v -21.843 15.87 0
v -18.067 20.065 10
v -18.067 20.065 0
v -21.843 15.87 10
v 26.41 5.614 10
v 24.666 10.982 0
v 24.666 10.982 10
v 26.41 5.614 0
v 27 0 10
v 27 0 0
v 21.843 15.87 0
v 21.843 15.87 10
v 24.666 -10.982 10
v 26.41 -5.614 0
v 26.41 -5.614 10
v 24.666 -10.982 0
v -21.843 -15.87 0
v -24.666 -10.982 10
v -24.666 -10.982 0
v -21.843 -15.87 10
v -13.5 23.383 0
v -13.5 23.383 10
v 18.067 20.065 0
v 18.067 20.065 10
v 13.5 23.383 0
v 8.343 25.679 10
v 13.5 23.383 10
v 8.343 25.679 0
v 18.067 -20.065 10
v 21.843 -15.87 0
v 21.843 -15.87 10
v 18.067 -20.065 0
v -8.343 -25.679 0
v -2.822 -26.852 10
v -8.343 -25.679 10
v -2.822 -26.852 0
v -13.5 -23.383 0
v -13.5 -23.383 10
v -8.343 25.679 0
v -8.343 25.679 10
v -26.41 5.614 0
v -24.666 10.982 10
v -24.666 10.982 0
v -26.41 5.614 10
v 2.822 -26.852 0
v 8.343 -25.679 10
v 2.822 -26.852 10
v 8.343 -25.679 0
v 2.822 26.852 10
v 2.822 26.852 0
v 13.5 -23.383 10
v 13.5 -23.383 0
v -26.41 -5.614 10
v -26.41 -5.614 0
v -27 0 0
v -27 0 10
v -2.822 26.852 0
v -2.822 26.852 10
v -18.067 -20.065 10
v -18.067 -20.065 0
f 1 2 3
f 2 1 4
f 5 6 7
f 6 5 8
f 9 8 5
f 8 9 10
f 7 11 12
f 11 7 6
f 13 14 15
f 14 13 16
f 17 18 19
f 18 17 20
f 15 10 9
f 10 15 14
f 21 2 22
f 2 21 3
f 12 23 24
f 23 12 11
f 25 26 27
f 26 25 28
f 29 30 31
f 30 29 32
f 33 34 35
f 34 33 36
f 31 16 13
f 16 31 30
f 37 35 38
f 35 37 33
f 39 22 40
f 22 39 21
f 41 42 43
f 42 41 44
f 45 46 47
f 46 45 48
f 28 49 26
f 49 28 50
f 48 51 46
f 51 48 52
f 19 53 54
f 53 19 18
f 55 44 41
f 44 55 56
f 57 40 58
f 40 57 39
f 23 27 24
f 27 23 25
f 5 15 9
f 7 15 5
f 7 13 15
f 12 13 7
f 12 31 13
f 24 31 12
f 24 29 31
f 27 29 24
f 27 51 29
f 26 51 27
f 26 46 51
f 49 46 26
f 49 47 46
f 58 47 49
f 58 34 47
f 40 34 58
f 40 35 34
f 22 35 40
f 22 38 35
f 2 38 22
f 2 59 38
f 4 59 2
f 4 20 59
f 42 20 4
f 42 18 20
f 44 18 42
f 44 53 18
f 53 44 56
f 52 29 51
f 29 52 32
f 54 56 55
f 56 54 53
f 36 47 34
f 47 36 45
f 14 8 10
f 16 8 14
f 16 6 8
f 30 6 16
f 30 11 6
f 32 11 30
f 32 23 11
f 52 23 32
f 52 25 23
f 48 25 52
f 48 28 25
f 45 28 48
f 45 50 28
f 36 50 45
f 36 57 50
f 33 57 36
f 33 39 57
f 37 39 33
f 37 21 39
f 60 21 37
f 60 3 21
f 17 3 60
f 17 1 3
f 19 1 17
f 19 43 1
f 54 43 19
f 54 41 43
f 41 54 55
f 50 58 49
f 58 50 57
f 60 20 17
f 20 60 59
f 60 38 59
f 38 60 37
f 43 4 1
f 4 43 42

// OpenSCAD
difference() {
	cylinder(h = 10, r = 27.0);
	rotate(a = -20) {
		translate(v = [30, 0, 0]) {
			cube(size = [10, 5, 12]);
		}
	}
	rotate(a = -19) {
		translate(v = [30, 0, 0]) {
			cube(size = [10, 5, 12]);
		}
	}
	rotate(a = -18) {
		translate(v = [30, 0, 0]) {
			cube(size = [10, 5, 12]);
		}
	}
	rotate(a = -17) {
		translate(v = [30, 0, 0]) {
			cube(size = [10, 5, 12]);
		}
	}
	rotate(a = -16) {
		translate(v = [30, 0, 0]) {
			cube(size = [10, 5, 12]);
		}
	}
	rotate(a = -15) {
		translate(v = [30, 0, 0]) {
			cube(size = [10, 5, 12]);
		}
	}
	rotate(a = -14) {
		translate(v = [30, 0, 0]) {
			cube(size = [10, 5, 12]);
		}
	}
	rotate(a = -13) {
		translate(v = [30, 0, 0]) {
			cube(size = [10, 5, 12]);
		}
	}
	rotate(a = -12) {
		translate(v = [30, 0, 0]) {
			cube(size = [10, 5, 12]);
		}
	}
	rotate(a = -11) {
		translate(v = [30, 0, 0]) {
			cube(size = [10, 5, 12]);
		}
	}
	rotate(a = -10) {
		translate(v = [30, 0, 0]) {
			cube(size = [10, 5, 12]);
		}
	}
	rotate(a = -9) {
		translate(v = [30, 0, 0]) {
			cube(size = [10, 5, 12]);
		}
	}
	rotate(a = -8) {
		translate(v = [30, 0, 0]) {
			cube(size = [10, 5, 12]);
		}
	}
	rotate(a = -7) {
		translate(v = [30, 0, 0]) {
			cube(size = [10, 5, 12]);
		}
	}
	rotate(a = -6) {
		translate(v = [30, 0, 0]) {
			cube(size = [10, 5, 12]);
		}
	}
	rotate(a = -5) {
		translate(v = [30, 0, 0]) {
			cube(size = [10, 5, 12]);
		}
	}
	rotate(a = -4) {
		translate(v = [30, 0, 0]) {
			cube(size = [10, 5, 12]);
		}
	}
	rotate(a = -3) {
		translate(v = [30, 0, 0]) {
			cube(size = [10, 5, 12]);
		}
	}
	rotate(a = -2) {
		translate(v = [30, 0, 0]) {
			cube(size = [10, 5, 12]);
		}
	}
	rotate(a = -1) {
		translate(v = [30, 0, 0]) {
			cube(size = [10, 5, 12]);
		}
	}
	rotate(a = 0) {
		translate(v = [30, 0, 0]) {
			cube(size = [10, 5, 12]);
		}
	}
	rotate(a = 1) {
		translate(v = [30, 0, 0]) {
			cube(size = [10, 5, 12]);
		}
	}
	rotate(a = 2) {
		translate(v = [30, 0, 0]) {
			cube(size = [10, 5, 12]);
		}
	}
	rotate(a = 3) {
		translate(v = [30, 0, 0]) {
			cube(size = [10, 5, 12]);
		}
	}
	rotate(a = 4) {
		translate(v = [30, 0, 0]) {
			cube(size = [10, 5, 12]);
		}
	}
	rotate(a = 5) {
		translate(v = [30, 0, 0]) {
			cube(size = [10, 5, 12]);
		}
	}
	rotate(a = 6) {
		translate(v = [30, 0, 0]) {
			cube(size = [10, 5, 12]);
		}
	}
	rotate(a = 7) {
		translate(v = [30, 0, 0]) {
			cube(size = [10, 5, 12]);
		}
	}
	rotate(a = 8) {
		translate(v = [30, 0, 0]) {
			cube(size = [10, 5, 12]);
		}
	}
	rotate(a = 9) {
		translate(v = [30, 0, 0]) {
			cube(size = [10, 5, 12]);
		}
	}
	rotate(a = 10) {
		translate(v = [30, 0, 0]) {
			cube(size = [10, 5, 12]);
		}
	}
	rotate(a = 11) {
		translate(v = [30, 0, 0]) {
			cube(size = [10, 5, 12]);
		}
	}
	rotate(a = 12) {
		translate(v = [30, 0, 0]) {
			cube(size = [10, 5, 12]);
		}
	}
	rotate(a = 13) {
		translate(v = [30, 0, 0]) {
			cube(size = [10, 5, 12]);
		}
	}
	rotate(a = 14) {
		translate(v = [30, 0, 0]) {
			cube(size = [10, 5, 12]);
		}
	}
	rotate(a = 15) {
		translate(v = [30, 0, 0]) {
			cube(size = [10, 5, 12]);
		}
	}
	rotate(a = 16) {
		translate(v = [30, 0, 0]) {
			cube(size = [10, 5, 12]);
		}
	}
	rotate(a = 17) {
		translate(v = [30, 0, 0]) {
			cube(size = [10, 5, 12]);
		}
	}
	rotate(a = 18) {
		translate(v = [30, 0, 0]) {
			cube(size = [10, 5, 12]);
		}
	}
	rotate(a = 19) {
		translate(v = [30, 0, 0]) {
			cube(size = [10, 5, 12]);
		}
	}
	rotate(a = 20) {
		translate(v = [30, 0, 0]) {
			cube(size = [10, 5, 12]);
		}
	}
}
